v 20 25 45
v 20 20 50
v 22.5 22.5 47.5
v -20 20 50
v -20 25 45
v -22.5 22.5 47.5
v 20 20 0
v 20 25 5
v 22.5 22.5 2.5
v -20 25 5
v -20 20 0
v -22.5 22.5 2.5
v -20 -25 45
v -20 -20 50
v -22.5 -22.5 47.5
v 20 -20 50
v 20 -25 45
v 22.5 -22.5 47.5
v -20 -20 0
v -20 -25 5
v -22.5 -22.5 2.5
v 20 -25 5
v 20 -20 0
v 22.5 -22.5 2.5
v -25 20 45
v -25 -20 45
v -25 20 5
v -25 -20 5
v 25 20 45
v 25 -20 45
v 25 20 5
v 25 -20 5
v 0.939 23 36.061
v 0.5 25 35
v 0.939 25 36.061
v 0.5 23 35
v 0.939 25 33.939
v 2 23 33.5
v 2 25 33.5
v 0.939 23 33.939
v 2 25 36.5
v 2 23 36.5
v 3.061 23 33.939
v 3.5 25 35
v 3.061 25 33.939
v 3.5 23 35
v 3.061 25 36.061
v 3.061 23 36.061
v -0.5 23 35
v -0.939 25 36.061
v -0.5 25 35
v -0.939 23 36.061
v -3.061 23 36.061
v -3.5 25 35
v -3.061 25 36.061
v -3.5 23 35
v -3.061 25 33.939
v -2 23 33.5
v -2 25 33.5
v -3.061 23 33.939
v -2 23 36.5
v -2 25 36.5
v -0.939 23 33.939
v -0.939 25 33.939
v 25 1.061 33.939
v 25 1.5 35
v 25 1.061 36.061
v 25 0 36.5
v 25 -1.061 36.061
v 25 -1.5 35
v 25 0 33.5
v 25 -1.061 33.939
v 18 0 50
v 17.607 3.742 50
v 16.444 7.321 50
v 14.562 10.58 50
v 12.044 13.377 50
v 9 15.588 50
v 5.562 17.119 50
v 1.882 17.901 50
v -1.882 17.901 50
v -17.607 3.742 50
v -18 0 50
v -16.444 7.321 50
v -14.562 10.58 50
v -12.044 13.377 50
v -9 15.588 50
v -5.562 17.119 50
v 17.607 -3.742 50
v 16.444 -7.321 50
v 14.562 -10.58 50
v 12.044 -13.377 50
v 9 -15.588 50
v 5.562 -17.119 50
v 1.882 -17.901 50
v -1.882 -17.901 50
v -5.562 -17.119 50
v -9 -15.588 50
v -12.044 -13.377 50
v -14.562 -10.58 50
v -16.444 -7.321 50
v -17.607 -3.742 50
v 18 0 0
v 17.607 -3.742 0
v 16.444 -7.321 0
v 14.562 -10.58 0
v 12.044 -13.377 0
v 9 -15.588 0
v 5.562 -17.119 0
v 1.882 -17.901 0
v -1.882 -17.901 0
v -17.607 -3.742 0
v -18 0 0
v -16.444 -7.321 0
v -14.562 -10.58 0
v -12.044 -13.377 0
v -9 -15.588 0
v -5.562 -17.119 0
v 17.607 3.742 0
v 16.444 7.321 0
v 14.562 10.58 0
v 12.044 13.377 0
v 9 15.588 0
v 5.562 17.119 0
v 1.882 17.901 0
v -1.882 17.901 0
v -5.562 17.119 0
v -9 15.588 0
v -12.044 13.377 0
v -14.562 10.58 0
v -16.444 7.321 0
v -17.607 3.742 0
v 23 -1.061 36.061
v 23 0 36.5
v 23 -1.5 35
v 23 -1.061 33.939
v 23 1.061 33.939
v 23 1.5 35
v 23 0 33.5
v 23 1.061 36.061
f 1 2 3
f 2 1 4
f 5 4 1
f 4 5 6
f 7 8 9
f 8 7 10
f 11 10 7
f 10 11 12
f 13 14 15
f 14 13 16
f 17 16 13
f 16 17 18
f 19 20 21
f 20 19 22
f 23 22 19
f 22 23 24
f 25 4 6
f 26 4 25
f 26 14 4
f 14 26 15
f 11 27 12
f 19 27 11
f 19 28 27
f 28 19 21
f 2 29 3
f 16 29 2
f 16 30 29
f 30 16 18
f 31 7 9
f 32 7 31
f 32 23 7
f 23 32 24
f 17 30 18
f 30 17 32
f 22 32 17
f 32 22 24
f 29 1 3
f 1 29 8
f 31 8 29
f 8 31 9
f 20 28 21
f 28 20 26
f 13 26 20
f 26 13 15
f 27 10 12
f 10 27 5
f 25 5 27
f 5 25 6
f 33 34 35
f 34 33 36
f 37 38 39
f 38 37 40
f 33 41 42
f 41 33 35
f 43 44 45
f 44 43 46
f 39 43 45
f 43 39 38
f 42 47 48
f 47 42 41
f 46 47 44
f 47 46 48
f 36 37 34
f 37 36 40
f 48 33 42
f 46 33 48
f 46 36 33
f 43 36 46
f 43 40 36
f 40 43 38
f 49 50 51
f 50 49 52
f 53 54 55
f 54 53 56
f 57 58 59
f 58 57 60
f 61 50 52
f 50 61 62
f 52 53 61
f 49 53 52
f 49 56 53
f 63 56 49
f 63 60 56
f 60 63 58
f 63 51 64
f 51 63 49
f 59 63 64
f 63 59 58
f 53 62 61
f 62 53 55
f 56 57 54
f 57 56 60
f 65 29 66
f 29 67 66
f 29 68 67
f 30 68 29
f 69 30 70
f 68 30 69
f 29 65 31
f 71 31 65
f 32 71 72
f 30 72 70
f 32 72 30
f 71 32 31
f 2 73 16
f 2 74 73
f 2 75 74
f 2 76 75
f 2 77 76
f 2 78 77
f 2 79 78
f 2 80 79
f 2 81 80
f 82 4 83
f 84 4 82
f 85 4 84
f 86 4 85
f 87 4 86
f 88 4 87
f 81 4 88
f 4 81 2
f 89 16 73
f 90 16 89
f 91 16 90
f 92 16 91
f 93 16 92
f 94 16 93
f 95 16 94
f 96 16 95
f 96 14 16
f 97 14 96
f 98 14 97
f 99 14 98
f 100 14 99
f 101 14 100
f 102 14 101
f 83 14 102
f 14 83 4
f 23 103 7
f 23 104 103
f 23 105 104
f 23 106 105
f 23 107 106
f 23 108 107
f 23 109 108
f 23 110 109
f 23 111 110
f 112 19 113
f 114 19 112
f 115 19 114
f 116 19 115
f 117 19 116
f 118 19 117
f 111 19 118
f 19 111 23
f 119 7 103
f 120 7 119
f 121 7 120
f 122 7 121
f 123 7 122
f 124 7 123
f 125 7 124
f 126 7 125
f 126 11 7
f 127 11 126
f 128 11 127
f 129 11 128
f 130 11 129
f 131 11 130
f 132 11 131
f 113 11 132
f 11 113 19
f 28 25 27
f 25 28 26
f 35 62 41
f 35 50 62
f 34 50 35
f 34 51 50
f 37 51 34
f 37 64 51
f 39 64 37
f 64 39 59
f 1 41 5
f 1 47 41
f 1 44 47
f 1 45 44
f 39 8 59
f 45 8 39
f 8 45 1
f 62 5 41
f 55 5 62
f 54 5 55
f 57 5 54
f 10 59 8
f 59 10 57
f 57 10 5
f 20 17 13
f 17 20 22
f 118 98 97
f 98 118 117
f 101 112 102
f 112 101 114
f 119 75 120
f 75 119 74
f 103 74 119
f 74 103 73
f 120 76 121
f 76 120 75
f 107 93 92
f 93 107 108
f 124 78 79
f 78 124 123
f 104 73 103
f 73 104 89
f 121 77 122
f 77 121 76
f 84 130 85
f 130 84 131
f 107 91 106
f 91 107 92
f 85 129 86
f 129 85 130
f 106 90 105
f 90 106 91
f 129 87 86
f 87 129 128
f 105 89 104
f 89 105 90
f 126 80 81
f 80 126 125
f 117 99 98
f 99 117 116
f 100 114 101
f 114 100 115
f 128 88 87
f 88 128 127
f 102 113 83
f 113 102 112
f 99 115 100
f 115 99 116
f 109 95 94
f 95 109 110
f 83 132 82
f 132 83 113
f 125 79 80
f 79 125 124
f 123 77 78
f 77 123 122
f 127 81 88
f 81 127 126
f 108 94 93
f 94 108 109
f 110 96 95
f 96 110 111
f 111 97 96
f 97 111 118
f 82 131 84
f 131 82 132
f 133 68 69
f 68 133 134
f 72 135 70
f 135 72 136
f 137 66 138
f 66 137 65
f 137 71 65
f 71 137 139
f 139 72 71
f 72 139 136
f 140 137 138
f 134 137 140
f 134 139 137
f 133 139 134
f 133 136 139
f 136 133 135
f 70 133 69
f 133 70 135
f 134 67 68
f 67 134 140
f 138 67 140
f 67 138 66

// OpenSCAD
module FourChamfer(sizes,chamfer) {
    m = max(sizes) + 1;
    for(y_scale=[1,-1])
    for(z_scale=[1,-1])
        scale([1,y_scale,z_scale])
        translate([0,sizes[1]/2+sin(45)*m-chamfer,sizes[2]/2])
        rotate([45,0,0])
        cube([m,m,m], center=true);
}

module FaceMark(surface, n) {
    spacing = 4;
    width = (n-1) * spacing;
    left = width / 2;
    for(i=[0:n-1])
        translate([surface-2, -left+i*spacing, 0])
        rotate([0,90,0])
        cylinder(d=3,h=50,$fn=8);
}

module ChamferCube(sizes,chamfer) {
    difference() {
        cube(sizes,center=true);
        FourChamfer(sizes, chamfer);
        rotate([0,0,90])
            FourChamfer([sizes[1], sizes[0], sizes[2]], chamfer);
        rotate([90,90,0])
            FourChamfer([sizes[2], sizes[0], sizes[1]], chamfer);
        translate([0,0,-sizes[2]/2-1])
            cylinder(r=sizes[2]/2-chamfer-2,h=sizes[2]+2);
        
        // X face mark
        translate([0,0,10]) FaceMark(sizes[0]/2, 1);
        
        // Y face mark
        translate([0,0,10]) rotate([0,0,90]) FaceMark(sizes[1]/2,2);
    }
}

translate([0,0,25]) ChamferCube([50,50,50],5);
